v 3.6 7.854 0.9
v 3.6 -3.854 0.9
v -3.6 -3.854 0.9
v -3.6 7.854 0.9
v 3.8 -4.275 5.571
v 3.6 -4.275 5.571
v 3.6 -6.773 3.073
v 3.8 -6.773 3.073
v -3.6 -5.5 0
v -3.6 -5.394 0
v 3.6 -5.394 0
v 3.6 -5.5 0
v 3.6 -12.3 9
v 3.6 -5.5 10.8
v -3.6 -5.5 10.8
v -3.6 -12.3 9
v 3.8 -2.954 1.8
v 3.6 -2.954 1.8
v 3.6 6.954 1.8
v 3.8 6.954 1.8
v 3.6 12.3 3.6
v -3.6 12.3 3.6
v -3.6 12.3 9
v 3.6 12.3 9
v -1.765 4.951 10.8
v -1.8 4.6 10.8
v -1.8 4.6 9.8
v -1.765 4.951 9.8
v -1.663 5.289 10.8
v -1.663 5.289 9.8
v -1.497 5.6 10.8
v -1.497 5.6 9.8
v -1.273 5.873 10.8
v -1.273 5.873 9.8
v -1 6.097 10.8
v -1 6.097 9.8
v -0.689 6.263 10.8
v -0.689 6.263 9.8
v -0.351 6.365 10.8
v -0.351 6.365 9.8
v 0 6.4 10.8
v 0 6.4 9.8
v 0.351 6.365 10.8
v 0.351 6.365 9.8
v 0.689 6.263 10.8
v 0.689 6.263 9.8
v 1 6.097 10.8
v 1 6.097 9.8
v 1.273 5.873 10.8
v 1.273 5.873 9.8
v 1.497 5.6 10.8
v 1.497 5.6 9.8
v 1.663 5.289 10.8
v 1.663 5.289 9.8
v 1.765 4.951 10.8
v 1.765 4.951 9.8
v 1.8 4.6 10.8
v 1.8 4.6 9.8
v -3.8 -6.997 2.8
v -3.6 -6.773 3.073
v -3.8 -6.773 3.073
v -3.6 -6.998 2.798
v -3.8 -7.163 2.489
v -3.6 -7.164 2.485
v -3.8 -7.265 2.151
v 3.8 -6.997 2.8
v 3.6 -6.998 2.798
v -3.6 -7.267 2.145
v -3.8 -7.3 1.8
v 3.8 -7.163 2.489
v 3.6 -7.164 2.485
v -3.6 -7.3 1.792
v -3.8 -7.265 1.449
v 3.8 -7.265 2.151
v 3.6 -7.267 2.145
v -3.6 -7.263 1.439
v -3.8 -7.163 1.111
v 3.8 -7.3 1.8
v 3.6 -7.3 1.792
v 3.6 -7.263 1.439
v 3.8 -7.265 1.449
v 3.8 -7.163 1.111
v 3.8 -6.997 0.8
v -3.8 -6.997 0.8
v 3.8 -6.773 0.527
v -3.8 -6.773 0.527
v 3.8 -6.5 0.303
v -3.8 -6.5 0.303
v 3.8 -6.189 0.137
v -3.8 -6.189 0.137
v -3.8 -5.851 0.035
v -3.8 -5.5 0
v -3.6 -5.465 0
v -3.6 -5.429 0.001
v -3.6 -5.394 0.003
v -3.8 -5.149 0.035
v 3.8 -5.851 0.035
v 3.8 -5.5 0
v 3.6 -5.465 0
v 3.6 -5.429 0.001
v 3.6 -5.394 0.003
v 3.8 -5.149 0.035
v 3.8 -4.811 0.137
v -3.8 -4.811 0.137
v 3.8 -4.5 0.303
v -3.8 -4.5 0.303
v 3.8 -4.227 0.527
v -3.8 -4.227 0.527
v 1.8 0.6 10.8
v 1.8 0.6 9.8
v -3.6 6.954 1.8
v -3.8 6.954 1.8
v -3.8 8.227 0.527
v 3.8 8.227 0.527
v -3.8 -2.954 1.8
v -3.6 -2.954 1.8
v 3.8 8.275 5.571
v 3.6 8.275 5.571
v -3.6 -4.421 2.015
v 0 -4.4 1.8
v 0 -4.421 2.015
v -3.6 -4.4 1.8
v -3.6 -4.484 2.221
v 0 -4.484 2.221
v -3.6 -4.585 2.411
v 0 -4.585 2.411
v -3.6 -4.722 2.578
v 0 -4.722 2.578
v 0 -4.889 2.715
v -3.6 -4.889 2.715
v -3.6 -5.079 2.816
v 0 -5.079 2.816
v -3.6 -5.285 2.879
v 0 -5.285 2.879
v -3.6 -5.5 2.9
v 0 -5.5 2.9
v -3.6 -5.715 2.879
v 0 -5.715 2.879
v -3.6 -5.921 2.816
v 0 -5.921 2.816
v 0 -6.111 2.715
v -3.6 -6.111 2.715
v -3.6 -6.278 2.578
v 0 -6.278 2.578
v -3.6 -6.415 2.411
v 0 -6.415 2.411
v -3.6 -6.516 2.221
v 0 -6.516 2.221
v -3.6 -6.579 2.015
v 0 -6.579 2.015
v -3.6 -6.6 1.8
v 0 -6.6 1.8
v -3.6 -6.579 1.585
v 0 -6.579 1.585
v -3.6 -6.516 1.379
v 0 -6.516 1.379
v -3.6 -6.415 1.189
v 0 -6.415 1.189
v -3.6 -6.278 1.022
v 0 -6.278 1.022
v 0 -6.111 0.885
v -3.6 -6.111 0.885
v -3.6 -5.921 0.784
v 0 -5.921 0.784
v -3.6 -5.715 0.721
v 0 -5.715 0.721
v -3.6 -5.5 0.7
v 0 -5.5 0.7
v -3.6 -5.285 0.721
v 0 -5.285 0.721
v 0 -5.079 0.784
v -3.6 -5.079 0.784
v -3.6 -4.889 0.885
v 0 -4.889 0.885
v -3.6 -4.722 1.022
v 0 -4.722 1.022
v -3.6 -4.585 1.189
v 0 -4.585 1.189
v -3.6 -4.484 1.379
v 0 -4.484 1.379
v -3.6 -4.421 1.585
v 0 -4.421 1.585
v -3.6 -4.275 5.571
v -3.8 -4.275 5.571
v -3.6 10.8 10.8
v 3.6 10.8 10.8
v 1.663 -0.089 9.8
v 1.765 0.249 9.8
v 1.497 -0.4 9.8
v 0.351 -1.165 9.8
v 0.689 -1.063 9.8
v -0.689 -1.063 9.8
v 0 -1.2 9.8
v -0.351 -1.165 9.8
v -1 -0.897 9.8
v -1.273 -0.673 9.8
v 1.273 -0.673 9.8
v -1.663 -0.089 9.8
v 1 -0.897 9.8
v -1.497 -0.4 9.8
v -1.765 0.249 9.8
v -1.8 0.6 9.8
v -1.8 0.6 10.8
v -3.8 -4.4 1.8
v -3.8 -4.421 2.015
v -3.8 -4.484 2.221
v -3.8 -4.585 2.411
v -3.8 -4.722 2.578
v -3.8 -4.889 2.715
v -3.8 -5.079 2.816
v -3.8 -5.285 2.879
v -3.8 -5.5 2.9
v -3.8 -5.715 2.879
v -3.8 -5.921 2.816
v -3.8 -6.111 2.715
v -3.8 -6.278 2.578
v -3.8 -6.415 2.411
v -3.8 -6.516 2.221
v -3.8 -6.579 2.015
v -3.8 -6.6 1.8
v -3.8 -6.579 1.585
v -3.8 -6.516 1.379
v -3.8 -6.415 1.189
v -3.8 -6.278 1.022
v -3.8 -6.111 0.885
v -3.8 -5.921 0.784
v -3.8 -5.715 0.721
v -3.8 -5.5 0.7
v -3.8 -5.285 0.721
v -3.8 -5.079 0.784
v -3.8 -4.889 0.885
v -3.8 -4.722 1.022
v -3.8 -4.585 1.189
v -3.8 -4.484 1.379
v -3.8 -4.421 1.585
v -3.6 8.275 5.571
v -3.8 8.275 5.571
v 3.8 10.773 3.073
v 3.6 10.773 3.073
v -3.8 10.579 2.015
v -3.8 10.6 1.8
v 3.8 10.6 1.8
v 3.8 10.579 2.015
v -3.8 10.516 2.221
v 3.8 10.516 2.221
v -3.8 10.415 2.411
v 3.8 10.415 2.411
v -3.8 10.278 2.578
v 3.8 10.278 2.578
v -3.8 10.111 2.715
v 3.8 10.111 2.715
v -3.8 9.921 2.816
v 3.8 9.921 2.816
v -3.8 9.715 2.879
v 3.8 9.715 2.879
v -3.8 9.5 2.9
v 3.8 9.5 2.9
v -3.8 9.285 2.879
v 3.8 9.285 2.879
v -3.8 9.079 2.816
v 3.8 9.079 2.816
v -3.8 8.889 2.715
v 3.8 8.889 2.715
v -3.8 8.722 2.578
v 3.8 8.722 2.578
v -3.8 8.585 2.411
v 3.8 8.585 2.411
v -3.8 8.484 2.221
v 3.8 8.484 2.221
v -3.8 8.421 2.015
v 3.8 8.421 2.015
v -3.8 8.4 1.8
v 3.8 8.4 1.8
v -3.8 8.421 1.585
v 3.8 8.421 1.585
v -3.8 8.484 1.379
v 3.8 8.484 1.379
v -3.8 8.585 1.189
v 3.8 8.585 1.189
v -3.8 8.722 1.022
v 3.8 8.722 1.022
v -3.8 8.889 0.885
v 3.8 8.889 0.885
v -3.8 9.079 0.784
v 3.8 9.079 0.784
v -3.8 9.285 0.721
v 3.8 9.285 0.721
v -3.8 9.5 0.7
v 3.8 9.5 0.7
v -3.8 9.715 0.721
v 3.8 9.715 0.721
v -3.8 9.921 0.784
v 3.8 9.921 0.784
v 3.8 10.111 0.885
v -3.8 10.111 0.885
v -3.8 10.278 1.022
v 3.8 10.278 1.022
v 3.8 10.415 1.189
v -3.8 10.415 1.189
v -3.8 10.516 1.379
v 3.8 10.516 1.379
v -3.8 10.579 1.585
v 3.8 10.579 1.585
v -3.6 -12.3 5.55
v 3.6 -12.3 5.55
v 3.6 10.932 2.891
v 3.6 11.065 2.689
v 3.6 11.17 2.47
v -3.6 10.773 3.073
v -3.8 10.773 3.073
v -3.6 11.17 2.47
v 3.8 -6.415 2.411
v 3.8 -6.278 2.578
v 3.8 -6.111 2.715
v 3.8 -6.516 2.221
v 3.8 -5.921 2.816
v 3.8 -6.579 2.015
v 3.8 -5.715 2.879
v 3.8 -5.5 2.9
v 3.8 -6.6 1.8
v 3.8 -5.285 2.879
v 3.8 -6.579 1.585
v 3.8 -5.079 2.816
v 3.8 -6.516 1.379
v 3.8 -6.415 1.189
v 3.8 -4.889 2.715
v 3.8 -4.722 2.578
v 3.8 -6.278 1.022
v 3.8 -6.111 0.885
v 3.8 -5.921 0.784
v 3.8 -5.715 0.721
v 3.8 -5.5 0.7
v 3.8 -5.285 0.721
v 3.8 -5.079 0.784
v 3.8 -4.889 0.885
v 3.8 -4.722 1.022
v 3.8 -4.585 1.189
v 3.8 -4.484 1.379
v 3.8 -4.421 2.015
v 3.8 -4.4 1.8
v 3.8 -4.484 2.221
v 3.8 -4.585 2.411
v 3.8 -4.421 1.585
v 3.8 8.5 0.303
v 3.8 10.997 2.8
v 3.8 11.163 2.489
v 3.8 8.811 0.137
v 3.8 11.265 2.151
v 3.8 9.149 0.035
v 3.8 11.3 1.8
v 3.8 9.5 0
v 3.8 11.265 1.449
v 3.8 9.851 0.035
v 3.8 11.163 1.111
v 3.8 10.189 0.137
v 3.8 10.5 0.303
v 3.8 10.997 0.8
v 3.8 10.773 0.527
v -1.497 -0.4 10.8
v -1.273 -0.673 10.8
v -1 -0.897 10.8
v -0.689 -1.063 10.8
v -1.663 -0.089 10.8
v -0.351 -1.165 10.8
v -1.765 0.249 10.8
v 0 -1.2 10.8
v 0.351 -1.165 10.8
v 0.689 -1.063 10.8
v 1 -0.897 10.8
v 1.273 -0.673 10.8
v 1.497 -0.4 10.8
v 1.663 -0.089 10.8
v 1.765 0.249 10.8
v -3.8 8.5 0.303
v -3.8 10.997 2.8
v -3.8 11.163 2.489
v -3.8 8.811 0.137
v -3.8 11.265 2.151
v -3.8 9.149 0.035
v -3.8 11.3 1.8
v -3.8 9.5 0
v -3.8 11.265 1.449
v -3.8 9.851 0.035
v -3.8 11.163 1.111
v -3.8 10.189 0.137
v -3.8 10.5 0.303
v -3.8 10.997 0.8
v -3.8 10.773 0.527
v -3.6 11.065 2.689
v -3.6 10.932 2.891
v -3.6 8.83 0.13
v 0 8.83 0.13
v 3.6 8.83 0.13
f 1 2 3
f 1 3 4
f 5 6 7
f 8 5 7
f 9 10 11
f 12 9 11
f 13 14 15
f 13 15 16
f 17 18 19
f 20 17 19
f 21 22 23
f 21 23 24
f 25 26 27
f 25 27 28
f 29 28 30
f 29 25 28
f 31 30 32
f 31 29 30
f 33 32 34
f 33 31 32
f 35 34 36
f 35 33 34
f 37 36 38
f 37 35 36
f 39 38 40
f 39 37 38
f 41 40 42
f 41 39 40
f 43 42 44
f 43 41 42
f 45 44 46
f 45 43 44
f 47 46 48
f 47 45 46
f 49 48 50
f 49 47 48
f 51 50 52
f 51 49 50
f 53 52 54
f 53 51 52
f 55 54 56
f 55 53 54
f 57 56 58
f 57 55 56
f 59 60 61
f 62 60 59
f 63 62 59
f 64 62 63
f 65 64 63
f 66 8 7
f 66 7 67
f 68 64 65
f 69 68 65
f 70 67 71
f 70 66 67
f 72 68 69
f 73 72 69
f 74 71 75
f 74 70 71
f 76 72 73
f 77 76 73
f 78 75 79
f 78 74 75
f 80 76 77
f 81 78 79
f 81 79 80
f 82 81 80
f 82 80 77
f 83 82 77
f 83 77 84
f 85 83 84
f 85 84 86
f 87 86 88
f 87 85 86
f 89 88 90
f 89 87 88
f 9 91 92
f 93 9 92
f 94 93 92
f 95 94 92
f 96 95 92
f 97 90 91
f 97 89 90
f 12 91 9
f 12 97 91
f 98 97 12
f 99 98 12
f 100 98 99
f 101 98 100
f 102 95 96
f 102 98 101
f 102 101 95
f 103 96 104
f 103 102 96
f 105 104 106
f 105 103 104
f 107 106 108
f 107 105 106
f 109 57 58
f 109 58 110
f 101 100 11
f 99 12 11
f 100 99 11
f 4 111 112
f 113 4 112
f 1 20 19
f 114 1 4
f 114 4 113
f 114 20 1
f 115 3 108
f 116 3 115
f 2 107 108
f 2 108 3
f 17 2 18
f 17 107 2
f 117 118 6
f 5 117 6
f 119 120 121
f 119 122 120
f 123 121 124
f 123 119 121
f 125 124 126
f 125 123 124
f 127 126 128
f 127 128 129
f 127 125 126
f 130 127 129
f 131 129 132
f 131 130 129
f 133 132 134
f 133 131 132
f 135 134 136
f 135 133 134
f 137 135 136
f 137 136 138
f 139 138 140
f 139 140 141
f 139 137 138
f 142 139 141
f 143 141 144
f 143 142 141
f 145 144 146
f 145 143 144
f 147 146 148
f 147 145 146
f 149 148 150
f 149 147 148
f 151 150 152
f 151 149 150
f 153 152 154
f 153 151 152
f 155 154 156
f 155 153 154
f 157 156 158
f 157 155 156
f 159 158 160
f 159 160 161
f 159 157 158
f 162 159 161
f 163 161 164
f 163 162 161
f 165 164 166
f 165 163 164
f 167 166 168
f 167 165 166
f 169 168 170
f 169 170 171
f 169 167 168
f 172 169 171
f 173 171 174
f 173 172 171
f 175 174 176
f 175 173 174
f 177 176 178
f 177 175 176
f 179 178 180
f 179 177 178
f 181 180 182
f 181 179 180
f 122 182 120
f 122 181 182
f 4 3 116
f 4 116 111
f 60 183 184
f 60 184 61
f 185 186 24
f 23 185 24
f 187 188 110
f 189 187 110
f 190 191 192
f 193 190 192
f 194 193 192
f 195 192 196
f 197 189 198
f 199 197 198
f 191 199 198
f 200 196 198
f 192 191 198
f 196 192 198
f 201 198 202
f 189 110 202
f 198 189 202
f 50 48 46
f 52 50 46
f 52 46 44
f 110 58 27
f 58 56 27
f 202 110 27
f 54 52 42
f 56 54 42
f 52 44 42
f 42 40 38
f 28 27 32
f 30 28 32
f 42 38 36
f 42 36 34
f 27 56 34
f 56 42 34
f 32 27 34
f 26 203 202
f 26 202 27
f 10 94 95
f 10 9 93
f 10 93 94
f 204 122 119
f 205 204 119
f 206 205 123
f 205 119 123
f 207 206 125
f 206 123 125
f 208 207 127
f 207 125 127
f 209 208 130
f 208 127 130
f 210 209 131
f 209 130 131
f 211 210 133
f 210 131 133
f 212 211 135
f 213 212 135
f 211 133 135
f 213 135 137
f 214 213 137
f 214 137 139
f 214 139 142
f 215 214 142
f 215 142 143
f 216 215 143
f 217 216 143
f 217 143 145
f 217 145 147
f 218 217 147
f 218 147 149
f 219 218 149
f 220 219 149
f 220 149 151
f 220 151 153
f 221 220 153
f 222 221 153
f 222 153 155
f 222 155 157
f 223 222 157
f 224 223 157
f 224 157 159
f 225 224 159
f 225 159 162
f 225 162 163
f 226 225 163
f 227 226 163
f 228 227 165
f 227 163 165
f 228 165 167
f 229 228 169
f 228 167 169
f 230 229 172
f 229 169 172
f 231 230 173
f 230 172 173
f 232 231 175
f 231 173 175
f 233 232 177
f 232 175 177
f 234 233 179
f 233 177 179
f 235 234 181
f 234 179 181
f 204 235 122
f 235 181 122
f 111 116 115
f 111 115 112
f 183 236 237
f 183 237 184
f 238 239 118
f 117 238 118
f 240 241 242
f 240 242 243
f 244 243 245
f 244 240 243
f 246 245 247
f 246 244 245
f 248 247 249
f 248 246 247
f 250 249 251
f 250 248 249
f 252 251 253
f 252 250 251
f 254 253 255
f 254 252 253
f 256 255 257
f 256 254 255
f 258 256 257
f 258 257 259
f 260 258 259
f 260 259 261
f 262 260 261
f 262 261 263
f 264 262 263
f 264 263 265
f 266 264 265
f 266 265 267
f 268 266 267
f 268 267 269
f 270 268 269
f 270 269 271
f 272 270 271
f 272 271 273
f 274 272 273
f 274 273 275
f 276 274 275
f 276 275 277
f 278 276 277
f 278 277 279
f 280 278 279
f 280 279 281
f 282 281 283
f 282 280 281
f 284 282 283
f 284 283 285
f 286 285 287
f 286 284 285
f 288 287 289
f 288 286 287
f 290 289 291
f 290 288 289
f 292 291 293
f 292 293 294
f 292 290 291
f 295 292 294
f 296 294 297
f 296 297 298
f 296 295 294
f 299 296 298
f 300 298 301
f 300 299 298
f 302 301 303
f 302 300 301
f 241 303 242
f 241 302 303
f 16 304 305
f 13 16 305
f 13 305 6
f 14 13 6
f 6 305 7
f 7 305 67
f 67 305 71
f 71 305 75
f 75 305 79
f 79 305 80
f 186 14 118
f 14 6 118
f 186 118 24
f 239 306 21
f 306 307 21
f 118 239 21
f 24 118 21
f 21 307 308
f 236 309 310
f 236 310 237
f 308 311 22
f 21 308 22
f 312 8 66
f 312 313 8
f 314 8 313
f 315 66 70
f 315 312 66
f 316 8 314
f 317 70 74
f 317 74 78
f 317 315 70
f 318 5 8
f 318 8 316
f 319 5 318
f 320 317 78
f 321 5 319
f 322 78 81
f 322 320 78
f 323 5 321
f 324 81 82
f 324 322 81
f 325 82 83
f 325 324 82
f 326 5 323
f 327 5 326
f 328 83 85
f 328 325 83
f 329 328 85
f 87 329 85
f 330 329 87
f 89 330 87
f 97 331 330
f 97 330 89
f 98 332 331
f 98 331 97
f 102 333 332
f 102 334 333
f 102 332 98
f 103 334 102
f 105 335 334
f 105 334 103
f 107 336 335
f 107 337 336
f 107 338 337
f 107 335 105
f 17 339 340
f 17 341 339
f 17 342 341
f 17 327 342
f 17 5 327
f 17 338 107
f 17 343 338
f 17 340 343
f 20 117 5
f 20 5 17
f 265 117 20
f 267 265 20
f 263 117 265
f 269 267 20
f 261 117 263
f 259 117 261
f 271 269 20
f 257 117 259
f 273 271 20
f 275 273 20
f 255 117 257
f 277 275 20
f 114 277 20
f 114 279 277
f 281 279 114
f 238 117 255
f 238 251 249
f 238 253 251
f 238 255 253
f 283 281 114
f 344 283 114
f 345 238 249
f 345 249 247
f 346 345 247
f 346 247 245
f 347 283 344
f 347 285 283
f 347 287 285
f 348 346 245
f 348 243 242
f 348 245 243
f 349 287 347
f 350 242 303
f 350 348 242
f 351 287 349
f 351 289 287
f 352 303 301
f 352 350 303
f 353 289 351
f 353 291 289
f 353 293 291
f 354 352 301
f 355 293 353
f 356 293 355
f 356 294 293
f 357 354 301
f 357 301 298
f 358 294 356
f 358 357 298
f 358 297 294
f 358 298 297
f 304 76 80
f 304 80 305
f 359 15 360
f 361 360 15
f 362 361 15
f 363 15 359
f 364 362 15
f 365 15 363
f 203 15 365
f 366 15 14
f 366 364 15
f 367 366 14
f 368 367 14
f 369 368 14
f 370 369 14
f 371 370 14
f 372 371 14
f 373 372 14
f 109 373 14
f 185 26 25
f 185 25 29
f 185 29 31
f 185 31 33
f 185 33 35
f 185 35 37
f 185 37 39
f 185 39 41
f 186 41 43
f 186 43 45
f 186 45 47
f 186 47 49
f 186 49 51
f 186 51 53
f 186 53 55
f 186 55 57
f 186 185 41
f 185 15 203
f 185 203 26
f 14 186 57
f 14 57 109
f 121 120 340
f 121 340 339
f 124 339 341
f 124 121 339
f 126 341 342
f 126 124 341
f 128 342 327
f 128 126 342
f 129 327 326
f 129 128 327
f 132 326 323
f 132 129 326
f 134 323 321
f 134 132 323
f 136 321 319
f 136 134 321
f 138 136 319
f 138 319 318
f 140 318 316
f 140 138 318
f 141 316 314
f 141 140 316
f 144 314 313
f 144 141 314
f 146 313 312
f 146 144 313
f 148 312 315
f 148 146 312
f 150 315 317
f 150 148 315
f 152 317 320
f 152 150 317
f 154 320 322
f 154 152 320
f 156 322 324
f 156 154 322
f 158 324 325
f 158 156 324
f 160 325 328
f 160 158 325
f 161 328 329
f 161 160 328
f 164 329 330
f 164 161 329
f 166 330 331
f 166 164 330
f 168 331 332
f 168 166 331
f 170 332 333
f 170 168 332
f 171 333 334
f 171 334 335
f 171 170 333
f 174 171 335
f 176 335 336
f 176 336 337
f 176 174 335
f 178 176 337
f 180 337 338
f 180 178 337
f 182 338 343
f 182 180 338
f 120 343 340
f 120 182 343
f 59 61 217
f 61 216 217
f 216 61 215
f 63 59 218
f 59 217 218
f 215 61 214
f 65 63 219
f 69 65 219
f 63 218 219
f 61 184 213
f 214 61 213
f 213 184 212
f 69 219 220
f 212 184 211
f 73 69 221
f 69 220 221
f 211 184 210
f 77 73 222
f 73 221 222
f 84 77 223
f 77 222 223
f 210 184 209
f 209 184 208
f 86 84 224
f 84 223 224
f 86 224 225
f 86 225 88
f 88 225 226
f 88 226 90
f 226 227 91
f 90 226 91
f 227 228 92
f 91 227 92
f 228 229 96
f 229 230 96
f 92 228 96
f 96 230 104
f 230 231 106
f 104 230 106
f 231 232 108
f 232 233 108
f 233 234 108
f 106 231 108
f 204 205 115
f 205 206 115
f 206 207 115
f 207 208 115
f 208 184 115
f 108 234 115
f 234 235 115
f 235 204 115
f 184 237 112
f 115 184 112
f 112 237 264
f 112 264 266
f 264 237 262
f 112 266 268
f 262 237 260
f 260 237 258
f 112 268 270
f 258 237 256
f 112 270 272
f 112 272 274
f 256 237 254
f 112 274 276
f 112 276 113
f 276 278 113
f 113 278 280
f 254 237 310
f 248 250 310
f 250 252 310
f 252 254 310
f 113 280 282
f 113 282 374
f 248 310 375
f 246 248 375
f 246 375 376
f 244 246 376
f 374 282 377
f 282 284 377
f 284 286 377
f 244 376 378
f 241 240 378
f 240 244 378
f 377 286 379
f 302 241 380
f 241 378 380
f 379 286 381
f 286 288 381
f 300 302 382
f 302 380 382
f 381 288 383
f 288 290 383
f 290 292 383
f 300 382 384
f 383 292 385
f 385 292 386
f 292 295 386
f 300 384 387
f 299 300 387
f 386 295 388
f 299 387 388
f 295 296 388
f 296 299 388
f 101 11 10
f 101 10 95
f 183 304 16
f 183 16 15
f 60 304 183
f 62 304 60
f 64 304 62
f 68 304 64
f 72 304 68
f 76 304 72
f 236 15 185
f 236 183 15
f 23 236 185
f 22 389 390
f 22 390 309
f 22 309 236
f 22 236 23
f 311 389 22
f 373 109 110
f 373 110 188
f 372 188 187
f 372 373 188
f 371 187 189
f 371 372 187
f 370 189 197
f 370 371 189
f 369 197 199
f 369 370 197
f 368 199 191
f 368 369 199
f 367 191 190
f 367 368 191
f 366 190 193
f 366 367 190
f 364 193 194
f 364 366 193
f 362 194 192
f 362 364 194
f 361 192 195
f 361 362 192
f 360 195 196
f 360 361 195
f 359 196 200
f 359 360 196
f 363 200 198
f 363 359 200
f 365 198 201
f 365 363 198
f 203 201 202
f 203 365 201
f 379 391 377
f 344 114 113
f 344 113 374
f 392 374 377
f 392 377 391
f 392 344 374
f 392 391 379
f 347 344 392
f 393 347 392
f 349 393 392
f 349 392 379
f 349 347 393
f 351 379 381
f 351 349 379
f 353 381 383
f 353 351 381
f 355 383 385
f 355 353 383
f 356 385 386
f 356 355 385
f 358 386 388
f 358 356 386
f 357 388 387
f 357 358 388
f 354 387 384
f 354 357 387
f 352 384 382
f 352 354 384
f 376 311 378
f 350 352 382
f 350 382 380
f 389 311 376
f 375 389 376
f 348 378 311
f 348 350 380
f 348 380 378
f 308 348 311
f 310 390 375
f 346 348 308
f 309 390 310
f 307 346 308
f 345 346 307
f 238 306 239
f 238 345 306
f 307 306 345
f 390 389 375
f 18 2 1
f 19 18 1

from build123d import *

# Parameters (mm, degrees)
SKETCH_1_W               = 7.2
SKETCH_1_H               = 24.6
EXTRUDE_1_DEPTH          = 10.8
CUT_EXTRUDE_3_DEPTH      = 7.2
CUT_EXTRUDE_1_DEPTH      = 10.8
EXTRUDE_START            = -3.6
SKETCH_3_R               = 1.1
EXTRUDE_3_DEPTH          = 3.8
CUT_EXTRUDE_2_DEPTH      = 18.963574255
CUT_EXTRUDE_2_DEPTH_BACK = 18.963574255
SKETCH_4_R               = 1.1
CUT_EXTRUDE_4_DEPTH      = 1


with BuildPart() as part:
    # 스케치1 → 보스-돌출1 (new body)
    with BuildSketch(Plane.XY):
        Rectangle(SKETCH_1_W, SKETCH_1_H)
    extrude(amount=EXTRUDE_1_DEPTH)

    # 스케치5 → 컷-돌출3 (cut)
    with BuildSketch(Plane.ZY.offset(3.6)):
        Polygon((0, 12.3), (0, 8.7), (3.6, 12.3), align=None)
    extrude(amount=-CUT_EXTRUDE_3_DEPTH, mode=Mode.SUBTRACT)

    # 스케치2 → 컷-돌출1 (cut)
    with BuildSketch(Plane(origin=(3.6, 0, 0), x_dir=(0, 0, -1), z_dir=(1, 0, 0))):
        Polygon((-10.8, -5.5), (-9, -12.3), (-10.8, -12.3), align=None)
        Polygon((-10.8, 12.3), (-10.8, 10.8), (-9, 12.3), align=None)
        Polygon((-0.9, 7.854415588), (-0.129530009, 8.829530009), (0, 8.7), (0, -5.394280654), (-0.129530009, -5.394280654), (-0.9, -3.854415588), align=None)
        Polygon((-5.55, -12.3), (0, -12.3), (0, -5.5), align=None)
    extrude(amount=-CUT_EXTRUDE_1_DEPTH, mode=Mode.SUBTRACT)

    # 스케치3 → 보스-돌출3 (add)
    with BuildSketch(Plane(origin=(3.6, 0, 0), x_dir=(0, 0, -1), z_dir=(1, 0, 0)).offset(EXTRUDE_START)):
        with BuildLine():
            Line((-3.072792206, 10.772792206), (-5.571079083, 8.27450533))
            Line((-5.571079083, 8.27450533), (-5.571079083, -4.27450533))
            Line((-5.571079083, -4.27450533), (-3.072792206, -6.772792206))
            ThreePointArc((-3.072792206, -6.772792206), (-0.527207794, -6.772792206), (-0.527207794, -4.227207794))
            Line((-0.527207794, -4.227207794), (-1.8, -2.954415588))
            Line((-1.8, -2.954415588), (-1.8, 6.954415588))
            Line((-1.8, 6.954415588), (-0.527207794, 8.227207794))
            ThreePointArc((-0.527207794, 8.227207794), (-0.527207794, 10.772792206), (-3.072792206, 10.772792206))
        make_face()
        with Locations(Location((-1.8, 9.5, 0), (0, 0, 90))):
            Circle(SKETCH_3_R, mode=Mode.SUBTRACT)
        with Locations(Location((-1.8, -5.5, 0), (0, 0, 90))):
            Circle(SKETCH_3_R, mode=Mode.SUBTRACT)
    extrude_3 = extrude(amount=EXTRUDE_3_DEPTH)

    # 스케치4 → 컷-돌출2 (cut, two sides: drawn at the far end of the back side and taken through both)
    with BuildSketch(Plane.ZY.offset(3.6).offset(-CUT_EXTRUDE_2_DEPTH_BACK)):
        with Locations(Location((1.8, 9.5, 0), (0, 0, 90))):
            Circle(SKETCH_4_R)
        with Locations(Location((1.8, -5.5, 0), (0, 0, 90))):
            Circle(SKETCH_4_R)
    extrude(amount=CUT_EXTRUDE_2_DEPTH + CUT_EXTRUDE_2_DEPTH_BACK, mode=Mode.SUBTRACT)

    # 대칭 복사2: 보스-돌출3 across plane
    add(extrude_3.mirror(Plane.ZY))

    # 스케치6 → 컷-돌출4 (cut)
    with BuildSketch(Plane.XY.offset(10.8)):
        with BuildLine():
            Line((1.8, 4.6), (1.8, 0.6))
            ThreePointArc((1.8, 0.6), (0, -1.2), (-1.8, 0.6))
            Line((-1.8, 0.6), (-1.8, 4.6))
            ThreePointArc((-1.8, 4.6), (0, 6.4), (1.8, 4.6))
        make_face()
    extrude(amount=-CUT_EXTRUDE_4_DEPTH, mode=Mode.SUBTRACT)


solid = part.part
